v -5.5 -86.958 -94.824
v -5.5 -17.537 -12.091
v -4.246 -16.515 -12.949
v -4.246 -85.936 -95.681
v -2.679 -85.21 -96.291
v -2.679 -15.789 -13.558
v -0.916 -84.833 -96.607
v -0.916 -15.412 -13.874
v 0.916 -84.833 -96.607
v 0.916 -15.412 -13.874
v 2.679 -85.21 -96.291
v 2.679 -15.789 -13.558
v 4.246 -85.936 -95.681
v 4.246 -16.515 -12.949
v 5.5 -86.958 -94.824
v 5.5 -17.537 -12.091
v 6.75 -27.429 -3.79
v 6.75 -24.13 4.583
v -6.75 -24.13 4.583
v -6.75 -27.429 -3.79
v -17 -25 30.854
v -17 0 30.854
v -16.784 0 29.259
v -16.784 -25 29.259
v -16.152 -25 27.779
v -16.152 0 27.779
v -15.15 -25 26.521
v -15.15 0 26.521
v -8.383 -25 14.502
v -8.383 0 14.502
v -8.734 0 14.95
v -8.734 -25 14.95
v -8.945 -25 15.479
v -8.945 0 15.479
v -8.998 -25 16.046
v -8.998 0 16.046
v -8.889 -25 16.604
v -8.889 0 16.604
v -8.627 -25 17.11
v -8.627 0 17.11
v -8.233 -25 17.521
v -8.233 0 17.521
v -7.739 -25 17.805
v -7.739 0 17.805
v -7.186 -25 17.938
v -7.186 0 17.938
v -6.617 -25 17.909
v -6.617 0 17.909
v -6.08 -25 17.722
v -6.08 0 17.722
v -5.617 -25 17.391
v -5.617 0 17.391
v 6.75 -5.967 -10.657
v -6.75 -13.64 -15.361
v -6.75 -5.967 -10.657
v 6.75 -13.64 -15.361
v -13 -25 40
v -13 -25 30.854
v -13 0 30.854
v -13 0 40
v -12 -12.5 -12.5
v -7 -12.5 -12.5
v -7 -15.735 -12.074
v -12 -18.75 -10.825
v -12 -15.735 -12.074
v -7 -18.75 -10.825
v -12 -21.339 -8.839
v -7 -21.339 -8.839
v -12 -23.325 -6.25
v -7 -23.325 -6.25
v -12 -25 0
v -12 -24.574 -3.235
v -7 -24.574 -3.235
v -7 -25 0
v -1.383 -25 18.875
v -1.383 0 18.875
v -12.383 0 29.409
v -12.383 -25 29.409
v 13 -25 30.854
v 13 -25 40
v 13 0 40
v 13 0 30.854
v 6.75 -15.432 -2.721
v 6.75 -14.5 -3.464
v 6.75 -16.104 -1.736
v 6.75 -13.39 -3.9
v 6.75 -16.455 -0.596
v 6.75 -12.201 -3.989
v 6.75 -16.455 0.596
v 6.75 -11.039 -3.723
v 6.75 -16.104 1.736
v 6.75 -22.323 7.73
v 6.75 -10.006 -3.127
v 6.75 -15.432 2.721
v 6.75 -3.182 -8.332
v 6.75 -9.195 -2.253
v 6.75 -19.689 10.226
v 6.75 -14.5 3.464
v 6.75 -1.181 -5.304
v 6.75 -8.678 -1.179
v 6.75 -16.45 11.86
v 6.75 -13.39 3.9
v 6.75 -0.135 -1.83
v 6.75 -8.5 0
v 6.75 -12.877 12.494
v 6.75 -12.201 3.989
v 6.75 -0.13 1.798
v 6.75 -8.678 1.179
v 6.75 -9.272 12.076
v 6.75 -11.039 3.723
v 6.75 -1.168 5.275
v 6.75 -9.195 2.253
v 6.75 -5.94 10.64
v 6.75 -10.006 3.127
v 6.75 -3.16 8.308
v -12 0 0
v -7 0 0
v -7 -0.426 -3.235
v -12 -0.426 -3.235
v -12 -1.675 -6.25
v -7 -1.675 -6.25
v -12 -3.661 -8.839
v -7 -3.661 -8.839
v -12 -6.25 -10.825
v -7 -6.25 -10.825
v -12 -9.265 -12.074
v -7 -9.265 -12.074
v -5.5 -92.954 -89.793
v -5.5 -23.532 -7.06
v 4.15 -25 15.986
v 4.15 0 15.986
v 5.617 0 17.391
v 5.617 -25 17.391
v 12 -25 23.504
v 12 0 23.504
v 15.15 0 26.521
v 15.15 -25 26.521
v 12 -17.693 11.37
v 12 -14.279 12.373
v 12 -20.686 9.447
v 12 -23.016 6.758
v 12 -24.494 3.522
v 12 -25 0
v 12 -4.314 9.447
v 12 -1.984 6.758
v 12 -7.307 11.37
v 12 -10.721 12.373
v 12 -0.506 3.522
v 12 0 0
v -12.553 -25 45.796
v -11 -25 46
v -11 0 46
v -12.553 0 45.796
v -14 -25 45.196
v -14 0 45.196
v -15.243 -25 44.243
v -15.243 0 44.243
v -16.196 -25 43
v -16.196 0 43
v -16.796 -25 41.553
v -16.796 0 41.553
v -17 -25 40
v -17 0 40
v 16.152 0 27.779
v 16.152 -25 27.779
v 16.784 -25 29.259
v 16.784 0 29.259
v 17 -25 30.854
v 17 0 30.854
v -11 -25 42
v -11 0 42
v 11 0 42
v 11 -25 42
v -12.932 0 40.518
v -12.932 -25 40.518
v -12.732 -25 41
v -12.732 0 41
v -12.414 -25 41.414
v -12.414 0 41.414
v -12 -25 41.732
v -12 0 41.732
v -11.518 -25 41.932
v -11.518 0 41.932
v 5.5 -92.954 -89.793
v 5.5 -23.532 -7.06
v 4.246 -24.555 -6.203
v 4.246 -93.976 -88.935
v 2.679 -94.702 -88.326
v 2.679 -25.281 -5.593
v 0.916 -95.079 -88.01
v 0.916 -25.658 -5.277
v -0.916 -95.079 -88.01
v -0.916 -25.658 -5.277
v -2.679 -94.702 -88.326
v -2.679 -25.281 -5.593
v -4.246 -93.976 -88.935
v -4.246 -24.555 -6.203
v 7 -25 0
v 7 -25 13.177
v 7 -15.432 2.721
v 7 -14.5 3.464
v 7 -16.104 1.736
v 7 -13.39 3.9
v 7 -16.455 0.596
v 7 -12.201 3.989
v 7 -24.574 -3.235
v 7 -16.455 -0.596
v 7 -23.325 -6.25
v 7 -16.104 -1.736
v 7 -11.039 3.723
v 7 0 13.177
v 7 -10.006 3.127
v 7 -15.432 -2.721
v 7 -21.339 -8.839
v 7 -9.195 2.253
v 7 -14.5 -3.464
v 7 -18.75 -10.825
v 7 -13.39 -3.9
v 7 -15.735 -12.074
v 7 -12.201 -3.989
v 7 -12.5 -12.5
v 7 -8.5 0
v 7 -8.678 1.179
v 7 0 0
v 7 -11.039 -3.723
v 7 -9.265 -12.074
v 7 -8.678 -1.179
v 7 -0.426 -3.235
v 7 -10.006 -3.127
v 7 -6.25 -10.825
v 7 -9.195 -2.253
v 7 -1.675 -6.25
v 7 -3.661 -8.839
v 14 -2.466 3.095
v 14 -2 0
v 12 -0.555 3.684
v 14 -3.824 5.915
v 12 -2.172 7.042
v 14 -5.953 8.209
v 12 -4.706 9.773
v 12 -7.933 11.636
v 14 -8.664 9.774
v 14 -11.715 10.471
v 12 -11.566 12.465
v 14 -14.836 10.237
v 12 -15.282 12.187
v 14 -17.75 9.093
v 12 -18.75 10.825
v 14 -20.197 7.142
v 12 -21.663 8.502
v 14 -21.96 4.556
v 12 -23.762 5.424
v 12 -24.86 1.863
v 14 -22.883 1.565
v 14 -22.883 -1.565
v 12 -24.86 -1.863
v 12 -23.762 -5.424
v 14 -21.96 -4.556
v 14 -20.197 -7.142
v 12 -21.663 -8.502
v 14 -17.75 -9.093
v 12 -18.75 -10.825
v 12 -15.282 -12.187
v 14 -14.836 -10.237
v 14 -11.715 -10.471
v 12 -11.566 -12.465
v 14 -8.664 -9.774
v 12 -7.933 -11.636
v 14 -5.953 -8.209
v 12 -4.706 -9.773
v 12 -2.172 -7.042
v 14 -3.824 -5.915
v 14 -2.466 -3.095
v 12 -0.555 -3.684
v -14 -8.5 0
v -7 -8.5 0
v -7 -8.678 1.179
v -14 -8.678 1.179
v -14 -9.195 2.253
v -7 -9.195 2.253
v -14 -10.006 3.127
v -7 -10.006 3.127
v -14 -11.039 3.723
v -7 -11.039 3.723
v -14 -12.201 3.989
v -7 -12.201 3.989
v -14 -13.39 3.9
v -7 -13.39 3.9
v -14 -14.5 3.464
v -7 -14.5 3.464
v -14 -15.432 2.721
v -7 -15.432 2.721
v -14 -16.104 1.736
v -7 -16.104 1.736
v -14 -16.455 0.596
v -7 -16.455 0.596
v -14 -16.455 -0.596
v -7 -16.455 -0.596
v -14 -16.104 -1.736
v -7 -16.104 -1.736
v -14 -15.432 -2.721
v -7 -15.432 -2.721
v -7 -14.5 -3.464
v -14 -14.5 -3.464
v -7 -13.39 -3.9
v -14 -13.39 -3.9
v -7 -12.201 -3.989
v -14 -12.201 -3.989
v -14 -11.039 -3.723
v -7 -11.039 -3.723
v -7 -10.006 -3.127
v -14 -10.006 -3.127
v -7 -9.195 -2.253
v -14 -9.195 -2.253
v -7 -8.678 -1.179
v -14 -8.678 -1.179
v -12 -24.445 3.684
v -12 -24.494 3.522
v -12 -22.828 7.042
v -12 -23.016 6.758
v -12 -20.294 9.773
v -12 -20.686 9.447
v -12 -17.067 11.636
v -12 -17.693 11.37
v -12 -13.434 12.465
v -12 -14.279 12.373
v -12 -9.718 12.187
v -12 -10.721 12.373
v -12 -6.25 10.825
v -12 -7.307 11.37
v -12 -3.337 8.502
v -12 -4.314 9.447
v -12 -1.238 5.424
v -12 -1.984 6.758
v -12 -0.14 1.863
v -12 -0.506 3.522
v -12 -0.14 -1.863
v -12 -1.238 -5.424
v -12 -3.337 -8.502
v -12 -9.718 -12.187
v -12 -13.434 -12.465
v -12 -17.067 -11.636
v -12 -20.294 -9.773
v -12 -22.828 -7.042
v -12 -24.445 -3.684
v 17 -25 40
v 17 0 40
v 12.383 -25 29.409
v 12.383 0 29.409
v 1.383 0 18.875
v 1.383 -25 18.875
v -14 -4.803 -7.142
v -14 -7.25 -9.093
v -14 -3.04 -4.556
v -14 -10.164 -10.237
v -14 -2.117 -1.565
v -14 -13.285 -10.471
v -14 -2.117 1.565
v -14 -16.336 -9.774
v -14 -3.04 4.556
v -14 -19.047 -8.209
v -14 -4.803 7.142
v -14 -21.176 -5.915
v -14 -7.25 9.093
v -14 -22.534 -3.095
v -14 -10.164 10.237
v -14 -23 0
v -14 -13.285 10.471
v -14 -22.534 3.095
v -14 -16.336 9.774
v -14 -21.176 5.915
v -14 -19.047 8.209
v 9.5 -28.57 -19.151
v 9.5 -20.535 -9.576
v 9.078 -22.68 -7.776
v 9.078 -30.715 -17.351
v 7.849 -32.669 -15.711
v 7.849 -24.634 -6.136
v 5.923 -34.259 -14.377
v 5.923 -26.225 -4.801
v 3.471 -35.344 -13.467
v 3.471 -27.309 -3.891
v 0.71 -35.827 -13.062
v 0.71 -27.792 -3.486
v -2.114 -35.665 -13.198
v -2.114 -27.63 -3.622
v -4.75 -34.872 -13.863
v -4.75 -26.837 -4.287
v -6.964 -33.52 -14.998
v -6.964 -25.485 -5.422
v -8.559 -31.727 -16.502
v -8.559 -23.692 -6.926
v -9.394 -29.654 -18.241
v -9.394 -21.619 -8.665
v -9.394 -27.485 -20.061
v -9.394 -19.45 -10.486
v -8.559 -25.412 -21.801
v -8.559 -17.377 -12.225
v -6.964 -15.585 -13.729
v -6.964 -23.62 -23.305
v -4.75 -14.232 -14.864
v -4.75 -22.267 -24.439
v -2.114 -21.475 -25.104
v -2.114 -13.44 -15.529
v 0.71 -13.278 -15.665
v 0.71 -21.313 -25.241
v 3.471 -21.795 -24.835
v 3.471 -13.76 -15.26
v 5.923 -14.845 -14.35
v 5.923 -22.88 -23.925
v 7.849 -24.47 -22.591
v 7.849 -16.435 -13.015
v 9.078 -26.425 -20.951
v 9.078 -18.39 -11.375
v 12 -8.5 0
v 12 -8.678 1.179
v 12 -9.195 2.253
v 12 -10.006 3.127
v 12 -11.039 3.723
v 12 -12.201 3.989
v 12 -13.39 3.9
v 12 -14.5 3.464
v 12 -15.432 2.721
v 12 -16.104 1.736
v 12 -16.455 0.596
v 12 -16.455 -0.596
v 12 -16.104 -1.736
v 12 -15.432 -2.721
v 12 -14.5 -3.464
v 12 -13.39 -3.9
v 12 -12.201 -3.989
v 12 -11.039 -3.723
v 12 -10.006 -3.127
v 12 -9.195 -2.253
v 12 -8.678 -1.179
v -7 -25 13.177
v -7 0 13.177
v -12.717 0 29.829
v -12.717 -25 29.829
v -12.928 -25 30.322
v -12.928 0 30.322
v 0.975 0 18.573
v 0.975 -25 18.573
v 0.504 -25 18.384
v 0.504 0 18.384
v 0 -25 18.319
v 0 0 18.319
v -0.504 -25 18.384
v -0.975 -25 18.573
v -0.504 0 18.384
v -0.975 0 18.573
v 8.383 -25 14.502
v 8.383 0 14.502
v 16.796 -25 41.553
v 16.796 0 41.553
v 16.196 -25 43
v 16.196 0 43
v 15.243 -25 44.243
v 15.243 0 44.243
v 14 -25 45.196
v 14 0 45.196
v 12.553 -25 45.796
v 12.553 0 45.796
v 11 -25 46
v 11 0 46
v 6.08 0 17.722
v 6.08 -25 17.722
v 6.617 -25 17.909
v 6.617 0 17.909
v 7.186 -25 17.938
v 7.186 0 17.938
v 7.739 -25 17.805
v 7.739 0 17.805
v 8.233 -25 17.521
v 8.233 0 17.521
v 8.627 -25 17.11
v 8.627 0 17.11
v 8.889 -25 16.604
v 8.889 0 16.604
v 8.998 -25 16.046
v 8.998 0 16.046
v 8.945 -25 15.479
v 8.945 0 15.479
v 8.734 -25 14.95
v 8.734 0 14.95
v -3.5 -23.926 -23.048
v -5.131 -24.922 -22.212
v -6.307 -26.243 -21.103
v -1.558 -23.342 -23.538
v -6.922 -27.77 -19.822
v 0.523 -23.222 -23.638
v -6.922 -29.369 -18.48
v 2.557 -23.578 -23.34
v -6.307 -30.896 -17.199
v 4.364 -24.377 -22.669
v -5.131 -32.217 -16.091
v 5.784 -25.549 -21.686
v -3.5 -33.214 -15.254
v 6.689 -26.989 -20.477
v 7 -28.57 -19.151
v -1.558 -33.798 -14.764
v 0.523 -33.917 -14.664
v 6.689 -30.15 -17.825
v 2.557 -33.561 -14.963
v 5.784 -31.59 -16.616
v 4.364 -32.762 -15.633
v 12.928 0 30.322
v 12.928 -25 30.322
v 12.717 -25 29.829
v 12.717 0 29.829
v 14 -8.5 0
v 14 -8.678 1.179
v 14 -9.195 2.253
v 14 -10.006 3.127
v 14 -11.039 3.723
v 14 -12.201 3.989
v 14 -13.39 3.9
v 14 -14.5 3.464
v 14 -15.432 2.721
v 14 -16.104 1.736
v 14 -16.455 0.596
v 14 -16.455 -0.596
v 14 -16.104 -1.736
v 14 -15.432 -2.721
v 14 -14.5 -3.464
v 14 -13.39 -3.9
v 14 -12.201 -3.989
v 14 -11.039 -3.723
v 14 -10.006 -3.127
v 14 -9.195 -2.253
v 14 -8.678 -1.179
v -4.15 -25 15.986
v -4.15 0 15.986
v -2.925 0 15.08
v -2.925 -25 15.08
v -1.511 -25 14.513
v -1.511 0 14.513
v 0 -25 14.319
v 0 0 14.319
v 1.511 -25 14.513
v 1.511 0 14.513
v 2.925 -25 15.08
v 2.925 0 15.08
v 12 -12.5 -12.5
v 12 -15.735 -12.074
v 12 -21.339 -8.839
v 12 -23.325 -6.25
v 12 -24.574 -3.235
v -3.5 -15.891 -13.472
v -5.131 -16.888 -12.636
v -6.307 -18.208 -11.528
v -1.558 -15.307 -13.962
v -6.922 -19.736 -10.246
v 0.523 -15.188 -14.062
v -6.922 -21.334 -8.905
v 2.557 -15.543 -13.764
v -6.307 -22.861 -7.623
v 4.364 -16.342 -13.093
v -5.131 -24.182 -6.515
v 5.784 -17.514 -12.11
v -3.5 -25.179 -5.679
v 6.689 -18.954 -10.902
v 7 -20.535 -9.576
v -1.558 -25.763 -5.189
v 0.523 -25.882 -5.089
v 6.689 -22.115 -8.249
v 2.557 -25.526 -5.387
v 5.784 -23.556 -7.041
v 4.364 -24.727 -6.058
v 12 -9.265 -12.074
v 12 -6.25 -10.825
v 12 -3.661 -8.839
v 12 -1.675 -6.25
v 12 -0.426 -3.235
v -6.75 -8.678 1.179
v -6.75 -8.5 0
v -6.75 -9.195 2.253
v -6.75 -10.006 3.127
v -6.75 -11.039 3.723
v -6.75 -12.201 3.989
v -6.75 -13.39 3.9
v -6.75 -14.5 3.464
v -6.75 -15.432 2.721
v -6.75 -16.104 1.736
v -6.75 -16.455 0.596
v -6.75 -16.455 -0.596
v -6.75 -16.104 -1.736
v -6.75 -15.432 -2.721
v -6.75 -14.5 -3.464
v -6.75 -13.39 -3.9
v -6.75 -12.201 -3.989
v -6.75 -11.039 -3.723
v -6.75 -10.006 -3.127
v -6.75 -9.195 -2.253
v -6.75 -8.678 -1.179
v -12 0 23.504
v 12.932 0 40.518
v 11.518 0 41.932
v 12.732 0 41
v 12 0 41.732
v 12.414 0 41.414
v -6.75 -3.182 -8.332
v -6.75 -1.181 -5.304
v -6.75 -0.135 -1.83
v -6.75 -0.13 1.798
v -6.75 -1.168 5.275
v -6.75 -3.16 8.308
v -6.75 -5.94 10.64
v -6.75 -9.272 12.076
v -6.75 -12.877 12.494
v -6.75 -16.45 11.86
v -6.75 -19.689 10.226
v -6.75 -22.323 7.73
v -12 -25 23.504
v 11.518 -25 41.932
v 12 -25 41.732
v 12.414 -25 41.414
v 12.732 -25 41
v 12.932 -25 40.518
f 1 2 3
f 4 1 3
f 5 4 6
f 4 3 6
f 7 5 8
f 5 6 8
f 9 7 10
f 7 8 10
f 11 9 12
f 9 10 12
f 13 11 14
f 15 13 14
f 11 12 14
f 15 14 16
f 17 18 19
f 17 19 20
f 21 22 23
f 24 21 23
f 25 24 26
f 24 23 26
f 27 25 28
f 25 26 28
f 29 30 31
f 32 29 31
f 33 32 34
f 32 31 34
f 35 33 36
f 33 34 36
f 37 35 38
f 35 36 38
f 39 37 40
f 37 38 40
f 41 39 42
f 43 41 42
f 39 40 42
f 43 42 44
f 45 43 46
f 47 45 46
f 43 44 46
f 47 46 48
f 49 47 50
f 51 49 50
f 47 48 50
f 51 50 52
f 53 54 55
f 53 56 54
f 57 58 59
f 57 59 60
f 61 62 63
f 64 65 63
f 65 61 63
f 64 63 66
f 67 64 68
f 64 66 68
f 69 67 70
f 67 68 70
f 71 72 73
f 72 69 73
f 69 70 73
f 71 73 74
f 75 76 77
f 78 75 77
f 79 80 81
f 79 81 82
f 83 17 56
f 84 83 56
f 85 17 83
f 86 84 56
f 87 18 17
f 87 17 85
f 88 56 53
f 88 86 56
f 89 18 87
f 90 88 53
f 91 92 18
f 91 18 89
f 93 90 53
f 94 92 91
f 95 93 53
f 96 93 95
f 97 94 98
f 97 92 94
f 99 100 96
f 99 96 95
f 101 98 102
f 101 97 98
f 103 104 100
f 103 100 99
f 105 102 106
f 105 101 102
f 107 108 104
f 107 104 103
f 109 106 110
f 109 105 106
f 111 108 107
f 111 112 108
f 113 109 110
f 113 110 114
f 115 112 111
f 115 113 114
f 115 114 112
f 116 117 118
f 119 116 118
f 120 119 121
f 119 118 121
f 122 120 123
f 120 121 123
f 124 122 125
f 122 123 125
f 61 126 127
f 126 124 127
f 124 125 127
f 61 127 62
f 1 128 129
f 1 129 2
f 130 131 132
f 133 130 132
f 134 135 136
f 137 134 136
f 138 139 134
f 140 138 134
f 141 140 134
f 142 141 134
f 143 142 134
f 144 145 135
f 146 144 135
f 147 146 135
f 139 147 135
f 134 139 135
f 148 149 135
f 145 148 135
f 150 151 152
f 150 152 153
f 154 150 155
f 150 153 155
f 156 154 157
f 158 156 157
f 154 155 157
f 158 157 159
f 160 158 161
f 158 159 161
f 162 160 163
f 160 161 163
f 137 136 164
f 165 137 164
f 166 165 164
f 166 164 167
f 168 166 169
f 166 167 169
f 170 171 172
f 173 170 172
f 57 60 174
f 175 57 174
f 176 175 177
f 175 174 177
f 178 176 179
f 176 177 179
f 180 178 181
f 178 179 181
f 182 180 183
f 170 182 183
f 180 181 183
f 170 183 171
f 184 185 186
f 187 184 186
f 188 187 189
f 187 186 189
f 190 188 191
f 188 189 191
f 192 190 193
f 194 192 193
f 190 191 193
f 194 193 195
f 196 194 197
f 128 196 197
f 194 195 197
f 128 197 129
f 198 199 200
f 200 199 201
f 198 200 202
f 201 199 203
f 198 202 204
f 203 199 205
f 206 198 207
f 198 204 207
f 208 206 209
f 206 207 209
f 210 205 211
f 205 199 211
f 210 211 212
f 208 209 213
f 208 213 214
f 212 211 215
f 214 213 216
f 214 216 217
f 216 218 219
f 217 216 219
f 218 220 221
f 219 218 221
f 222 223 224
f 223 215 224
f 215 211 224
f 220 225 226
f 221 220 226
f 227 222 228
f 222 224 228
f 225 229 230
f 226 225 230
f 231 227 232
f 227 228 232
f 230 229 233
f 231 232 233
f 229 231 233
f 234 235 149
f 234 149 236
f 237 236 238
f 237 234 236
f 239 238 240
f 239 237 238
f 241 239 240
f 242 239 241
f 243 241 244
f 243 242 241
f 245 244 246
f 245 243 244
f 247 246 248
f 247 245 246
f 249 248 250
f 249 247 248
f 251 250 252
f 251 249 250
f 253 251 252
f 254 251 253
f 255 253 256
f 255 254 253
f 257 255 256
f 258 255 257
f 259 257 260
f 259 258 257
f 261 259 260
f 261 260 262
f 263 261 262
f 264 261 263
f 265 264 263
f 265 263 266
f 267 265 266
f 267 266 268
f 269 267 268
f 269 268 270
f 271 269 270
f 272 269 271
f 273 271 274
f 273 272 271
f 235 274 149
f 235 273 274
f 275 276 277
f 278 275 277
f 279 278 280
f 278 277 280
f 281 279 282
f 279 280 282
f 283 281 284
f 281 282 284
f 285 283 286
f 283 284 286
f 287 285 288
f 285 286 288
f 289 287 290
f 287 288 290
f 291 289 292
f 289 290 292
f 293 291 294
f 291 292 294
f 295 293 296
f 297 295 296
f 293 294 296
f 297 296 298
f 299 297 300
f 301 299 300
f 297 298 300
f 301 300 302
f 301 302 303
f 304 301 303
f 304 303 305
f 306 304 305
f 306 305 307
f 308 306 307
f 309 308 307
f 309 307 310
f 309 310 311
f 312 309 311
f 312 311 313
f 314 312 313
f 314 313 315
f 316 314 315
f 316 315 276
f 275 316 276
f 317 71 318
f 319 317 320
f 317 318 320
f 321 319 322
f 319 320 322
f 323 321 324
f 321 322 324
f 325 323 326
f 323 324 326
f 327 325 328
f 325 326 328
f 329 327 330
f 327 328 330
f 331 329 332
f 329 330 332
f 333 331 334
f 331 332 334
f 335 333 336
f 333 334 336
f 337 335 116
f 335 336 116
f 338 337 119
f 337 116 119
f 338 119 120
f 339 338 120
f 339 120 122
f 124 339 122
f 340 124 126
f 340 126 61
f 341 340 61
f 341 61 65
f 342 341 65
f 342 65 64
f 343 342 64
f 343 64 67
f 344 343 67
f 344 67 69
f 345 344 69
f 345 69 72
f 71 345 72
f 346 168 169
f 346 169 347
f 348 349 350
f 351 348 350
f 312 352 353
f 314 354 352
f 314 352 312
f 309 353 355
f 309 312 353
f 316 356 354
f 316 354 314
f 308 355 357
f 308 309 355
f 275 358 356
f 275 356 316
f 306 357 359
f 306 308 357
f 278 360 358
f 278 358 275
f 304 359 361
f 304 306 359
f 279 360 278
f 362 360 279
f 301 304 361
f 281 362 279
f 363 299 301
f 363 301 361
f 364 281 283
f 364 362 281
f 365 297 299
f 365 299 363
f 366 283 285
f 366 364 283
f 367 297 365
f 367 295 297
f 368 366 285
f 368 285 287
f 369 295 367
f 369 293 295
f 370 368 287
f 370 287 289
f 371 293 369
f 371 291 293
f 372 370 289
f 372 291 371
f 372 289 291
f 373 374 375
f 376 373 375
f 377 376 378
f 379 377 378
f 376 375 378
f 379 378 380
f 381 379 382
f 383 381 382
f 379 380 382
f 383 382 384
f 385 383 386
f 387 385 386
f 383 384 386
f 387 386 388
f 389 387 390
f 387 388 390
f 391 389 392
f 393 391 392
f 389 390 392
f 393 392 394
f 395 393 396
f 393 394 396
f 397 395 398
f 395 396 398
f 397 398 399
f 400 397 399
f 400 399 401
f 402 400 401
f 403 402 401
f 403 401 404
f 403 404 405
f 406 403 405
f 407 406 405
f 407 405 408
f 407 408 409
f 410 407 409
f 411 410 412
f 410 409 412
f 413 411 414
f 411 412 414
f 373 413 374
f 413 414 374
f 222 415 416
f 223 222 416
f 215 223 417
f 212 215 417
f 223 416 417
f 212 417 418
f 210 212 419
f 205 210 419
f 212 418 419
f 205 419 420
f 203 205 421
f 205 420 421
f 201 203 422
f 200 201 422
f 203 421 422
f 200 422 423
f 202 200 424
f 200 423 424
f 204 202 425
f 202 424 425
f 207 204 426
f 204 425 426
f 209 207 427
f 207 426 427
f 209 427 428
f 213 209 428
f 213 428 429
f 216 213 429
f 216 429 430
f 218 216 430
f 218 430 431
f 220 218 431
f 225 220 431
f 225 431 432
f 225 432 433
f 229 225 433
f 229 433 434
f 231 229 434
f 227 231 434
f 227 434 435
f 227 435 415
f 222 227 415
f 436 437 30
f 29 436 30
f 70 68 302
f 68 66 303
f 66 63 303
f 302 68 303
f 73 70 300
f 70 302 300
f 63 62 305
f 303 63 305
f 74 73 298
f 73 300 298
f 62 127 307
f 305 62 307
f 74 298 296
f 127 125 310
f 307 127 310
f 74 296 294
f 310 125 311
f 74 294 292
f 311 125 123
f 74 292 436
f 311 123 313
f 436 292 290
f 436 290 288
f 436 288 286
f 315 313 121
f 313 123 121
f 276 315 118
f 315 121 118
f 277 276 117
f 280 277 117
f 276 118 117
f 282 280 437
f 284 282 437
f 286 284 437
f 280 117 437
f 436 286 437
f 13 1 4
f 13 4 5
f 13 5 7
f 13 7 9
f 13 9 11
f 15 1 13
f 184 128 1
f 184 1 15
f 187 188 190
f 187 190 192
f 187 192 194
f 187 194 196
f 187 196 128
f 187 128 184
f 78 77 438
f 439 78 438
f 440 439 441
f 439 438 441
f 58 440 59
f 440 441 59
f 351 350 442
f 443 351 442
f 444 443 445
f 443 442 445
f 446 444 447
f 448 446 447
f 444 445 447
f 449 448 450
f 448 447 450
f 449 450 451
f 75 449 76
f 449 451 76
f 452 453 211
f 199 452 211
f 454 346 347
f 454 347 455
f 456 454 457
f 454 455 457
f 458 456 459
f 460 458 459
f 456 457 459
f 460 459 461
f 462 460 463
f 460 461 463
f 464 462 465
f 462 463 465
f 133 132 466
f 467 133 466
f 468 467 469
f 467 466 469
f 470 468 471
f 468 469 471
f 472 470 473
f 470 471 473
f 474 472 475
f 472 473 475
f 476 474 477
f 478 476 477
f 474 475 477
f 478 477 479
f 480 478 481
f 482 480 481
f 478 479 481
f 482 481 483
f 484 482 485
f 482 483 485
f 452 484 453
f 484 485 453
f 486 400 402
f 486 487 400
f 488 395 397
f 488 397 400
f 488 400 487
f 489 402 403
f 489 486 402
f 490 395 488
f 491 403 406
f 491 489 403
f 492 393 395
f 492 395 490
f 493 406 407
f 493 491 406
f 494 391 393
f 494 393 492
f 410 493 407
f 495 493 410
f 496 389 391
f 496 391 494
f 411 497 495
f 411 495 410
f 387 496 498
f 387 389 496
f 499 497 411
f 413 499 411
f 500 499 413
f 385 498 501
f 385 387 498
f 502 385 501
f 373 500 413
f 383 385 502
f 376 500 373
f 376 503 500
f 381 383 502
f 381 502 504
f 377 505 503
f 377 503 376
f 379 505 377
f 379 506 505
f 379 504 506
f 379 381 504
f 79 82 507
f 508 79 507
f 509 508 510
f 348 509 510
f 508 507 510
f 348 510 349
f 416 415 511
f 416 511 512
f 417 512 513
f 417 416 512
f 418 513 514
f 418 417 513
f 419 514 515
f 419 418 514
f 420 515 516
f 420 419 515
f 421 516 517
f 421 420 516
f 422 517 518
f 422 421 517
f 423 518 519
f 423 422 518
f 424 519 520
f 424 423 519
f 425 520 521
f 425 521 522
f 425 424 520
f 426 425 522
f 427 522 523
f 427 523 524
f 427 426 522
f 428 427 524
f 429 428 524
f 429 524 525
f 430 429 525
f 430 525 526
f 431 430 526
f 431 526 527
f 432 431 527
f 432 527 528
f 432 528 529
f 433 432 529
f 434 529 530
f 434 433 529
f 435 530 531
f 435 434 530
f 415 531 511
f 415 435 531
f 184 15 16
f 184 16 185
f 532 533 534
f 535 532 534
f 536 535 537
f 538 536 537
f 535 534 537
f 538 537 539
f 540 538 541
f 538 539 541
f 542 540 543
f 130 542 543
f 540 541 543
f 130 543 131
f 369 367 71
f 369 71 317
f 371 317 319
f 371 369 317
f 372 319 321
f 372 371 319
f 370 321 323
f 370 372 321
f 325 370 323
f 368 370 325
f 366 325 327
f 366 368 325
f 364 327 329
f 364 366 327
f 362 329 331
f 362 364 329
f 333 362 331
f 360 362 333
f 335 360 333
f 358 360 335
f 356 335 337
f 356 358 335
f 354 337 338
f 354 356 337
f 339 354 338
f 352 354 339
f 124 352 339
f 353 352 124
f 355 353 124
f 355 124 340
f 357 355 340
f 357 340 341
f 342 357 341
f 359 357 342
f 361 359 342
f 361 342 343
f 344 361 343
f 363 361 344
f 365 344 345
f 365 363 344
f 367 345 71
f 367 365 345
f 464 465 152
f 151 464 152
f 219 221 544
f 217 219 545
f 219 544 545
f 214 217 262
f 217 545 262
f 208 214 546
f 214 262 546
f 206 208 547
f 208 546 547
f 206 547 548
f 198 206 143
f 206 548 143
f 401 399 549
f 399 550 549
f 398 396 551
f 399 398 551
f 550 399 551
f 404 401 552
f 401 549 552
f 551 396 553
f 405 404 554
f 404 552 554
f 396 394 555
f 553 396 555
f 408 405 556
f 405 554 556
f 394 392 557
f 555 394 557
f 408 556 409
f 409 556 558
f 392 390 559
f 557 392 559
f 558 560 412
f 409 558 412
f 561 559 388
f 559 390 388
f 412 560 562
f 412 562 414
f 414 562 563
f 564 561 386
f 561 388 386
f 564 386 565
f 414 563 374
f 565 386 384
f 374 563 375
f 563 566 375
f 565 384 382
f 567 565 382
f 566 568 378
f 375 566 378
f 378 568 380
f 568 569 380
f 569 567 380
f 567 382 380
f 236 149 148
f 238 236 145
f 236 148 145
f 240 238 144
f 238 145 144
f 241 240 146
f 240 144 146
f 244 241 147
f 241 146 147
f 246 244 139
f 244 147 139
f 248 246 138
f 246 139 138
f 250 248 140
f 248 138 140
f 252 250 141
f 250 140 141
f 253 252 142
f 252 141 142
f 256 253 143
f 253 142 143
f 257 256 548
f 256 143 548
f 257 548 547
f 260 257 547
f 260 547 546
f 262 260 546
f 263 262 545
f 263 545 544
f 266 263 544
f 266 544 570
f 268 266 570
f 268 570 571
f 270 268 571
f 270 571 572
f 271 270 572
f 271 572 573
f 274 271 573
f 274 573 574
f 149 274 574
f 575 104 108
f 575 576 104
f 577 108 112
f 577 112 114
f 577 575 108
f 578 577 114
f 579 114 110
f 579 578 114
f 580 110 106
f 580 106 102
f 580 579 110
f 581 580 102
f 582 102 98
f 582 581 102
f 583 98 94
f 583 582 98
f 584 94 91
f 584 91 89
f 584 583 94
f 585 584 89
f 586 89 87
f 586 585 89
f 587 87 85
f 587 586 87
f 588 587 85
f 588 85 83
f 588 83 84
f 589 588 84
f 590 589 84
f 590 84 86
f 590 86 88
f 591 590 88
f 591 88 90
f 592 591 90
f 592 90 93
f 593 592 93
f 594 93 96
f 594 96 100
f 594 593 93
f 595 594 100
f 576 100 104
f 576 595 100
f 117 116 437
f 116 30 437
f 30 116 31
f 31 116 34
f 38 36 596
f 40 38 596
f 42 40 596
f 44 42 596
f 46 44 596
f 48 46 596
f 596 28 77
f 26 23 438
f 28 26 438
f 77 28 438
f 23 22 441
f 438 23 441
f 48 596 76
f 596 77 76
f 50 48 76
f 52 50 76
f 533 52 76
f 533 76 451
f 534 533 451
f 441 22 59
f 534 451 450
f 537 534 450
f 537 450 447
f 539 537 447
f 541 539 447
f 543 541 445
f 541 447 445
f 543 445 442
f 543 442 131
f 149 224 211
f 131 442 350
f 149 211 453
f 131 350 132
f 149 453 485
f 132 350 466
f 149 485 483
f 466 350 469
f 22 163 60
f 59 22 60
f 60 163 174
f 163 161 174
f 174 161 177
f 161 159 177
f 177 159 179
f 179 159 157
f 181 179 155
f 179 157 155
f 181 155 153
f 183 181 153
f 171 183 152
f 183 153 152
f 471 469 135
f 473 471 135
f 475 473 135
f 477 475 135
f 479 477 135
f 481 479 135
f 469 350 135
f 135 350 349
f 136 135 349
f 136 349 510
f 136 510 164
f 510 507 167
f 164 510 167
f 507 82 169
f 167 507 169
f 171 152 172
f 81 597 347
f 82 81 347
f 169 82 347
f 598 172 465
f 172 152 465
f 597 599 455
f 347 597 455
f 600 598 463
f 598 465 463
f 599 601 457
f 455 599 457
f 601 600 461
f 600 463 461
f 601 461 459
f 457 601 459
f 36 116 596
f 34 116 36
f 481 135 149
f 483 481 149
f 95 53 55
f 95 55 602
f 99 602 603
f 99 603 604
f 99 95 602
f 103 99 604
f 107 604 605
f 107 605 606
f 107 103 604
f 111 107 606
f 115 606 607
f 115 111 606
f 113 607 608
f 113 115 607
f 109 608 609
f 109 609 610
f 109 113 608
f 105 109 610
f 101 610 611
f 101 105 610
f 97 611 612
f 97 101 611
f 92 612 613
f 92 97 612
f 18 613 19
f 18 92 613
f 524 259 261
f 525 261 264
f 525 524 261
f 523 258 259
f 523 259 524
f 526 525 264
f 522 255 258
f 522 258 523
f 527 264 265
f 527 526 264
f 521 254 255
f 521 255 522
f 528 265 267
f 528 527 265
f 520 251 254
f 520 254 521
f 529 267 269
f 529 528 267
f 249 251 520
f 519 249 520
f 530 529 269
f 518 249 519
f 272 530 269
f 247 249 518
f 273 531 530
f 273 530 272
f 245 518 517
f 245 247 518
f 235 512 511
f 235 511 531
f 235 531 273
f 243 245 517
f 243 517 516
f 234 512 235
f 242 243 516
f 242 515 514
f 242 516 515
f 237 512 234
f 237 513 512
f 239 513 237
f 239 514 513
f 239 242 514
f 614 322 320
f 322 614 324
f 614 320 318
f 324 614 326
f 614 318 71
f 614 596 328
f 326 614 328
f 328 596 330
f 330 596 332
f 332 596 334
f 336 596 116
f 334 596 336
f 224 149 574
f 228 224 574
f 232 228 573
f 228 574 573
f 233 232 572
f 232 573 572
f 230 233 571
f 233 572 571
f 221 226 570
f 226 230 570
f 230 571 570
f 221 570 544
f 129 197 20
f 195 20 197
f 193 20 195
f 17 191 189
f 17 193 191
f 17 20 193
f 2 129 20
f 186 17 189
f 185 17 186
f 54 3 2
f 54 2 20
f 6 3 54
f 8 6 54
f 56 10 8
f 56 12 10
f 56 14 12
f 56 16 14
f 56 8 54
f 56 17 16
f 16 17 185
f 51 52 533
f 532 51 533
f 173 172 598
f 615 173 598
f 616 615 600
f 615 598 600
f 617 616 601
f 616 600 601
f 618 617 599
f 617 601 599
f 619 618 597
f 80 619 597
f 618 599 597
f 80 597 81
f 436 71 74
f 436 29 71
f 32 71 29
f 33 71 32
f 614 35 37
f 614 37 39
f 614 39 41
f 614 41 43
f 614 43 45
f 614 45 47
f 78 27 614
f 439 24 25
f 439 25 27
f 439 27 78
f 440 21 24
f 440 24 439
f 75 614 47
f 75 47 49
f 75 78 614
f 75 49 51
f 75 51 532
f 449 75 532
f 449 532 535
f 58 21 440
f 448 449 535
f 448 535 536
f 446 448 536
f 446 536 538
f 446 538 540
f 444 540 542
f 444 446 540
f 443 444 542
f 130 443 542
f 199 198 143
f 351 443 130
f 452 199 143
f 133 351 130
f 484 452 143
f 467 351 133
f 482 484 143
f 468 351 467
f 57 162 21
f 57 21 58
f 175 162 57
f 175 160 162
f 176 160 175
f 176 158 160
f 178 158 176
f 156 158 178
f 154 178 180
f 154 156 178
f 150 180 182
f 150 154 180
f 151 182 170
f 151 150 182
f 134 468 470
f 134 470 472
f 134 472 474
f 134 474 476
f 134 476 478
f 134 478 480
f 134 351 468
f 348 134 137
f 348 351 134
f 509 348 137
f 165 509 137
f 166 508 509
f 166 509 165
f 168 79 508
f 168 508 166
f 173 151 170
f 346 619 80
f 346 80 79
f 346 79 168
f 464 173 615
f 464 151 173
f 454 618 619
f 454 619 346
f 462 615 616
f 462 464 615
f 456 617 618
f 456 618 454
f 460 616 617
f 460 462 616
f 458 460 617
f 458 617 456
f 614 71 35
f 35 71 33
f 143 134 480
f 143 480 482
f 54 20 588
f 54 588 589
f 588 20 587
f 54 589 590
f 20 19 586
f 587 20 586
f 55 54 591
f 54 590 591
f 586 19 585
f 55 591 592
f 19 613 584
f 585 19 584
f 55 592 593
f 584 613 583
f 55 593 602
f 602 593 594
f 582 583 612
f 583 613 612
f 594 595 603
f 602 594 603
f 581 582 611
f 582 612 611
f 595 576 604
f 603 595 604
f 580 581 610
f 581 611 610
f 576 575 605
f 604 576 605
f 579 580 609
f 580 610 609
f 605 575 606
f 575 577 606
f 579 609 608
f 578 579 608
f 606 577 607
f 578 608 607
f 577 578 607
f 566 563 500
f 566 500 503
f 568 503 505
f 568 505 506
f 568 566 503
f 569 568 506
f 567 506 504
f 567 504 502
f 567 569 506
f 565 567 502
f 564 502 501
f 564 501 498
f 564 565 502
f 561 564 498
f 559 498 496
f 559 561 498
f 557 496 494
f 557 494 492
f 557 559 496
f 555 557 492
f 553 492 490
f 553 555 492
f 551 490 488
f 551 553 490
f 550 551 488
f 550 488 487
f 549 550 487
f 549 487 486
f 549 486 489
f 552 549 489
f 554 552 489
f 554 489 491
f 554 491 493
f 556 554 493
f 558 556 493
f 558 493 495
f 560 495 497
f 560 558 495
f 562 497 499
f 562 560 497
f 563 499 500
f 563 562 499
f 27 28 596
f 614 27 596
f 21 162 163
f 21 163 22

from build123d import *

# Parameters (mm, degrees)
F1_DEPTH  = 25
F3_DEPTH  = 25
F2_R      = 12.5
F2_R_2    = 4
F4_DEPTH  = 2
F5_SIZE   = 1.99999
F6_R      = 12.5
F7_DEPTH  = 2
F8_SIZE   = 1.99999
F9_DEPTH  = 30
F10_R     = 4
F11_DEPTH = 6.75
F13_DEPTH = 108
F12_R     = 9.5
F12_R_2   = 7
F14_DEPTH = 12.5


# Not quite as in the source:
# - a fillet or chamfer is up to 0.001 mm smaller than in the source, because OpenCascade refuses the exact size


with BuildPart() as f1:
    # F0 (on Front) → F1 (new body)
    with BuildSketch(Plane.XZ):
        with BuildLine():
            ThreePointArc((-17, 30.8538616003), (-16.5181427671, 28.4979964934), (-15.1499665327, 26.520528267))
            Line((-15.1499665327, 26.520528267), (-12, 23.5038538771))
            Line((-12, 23.5038538771), (-12, -12.5))
            Line((-12, -12.5), (-7, -12.5))
            Line((-7, -12.5), (-7, 13.1769694163))
            Line((-7, 13.1769694163), (-8.3833221776, 14.5017557411))
            ThreePointArc((-8.3833221776, 14.5017557411), (-8.4444444444, 17.3295223631), (-5.6166778224, 17.39064463))
            Line((-5.6166778224, 17.39064463), (-4.1499665327, 15.9859978379))
            ThreePointArc((-4.1499665327, 15.9859978379), (0, 14.3193311712), (4.1499665327, 15.9859978379))
            Line((4.1499665327, 15.9859978379), (5.6166778224, 17.39064463))
            ThreePointArc((5.6166778224, 17.39064463), (8.4444444444, 17.3295223631), (8.3833221776, 14.5017557411))
            Line((8.3833221776, 14.5017557411), (7, 13.1769694163))
            Line((7, 13.1769694163), (7, -12.5))
            Line((7, -12.5), (12, -12.5))
            Line((12, -12.5), (12, 23.5038538771))
            Line((12, 23.5038538771), (15.1499665327, 26.520528267))
            ThreePointArc((15.1499665327, 26.520528267), (16.5181427671, 28.4979964934), (17, 30.8538616003))
            Line((17, 30.8538616003), (17, 40))
            ThreePointArc((17, 40), (15.2426406871, 44.2426406871), (11, 46))
            Line((11, 46), (0, 46))
            Line((0, 46), (-11, 46))
            ThreePointArc((-11, 46), (-15.2426406871, 44.2426406871), (-17, 40))
            Line((-17, 40), (-17, 30.8538616003))
        make_face()
        with BuildLine():
            Line((-11, 42), (0, 42))
            Line((0, 42), (11, 42))
            ThreePointArc((11, 42), (12.4142135624, 41.4142135624), (13, 40))
            Line((13, 40), (13, 30.8538616003))
            ThreePointArc((13, 30.8538616003), (12.8393809224, 30.0685732313), (12.3833221776, 29.4094171559))
            Line((12.3833221776, 29.4094171559), (1.3833221776, 18.8748867268))
            ThreePointArc((1.3833221776, 18.8748867268), (0, 18.3193311712), (-1.3833221776, 18.8748867268))
            Line((-1.3833221776, 18.8748867268), (-12.3833221776, 29.4094171559))
            ThreePointArc((-12.3833221776, 29.4094171559), (-12.8393809224, 30.0685732313), (-13, 30.8538616003))
            Line((-13, 30.8538616003), (-13, 40))
            ThreePointArc((-13, 40), (-12.4142135624, 41.4142135624), (-11, 42))
        make_face(mode=Mode.SUBTRACT)
    extrude(amount=F1_DEPTH)

    # F2 (on face) → F3 (cut)
    with BuildSketch(Plane.YZ.offset(12)):
        with BuildLine():
            ThreePointArc((-12.5, -12.5), (-21.3388347734, -8.8388347563), (-25, 2.41e-08))
            Line((-25, 2.41e-08), (-25, -12.5))
            Line((-25, -12.5), (-12.5, -12.5))
        make_face()
        with BuildLine():
            Line((0, -12.5), (0, 0))
            ThreePointArc((0, 0), (-3.6611652352, -8.8388347648), (-12.5, -12.5))
            Line((-12.5, -12.5), (0, -12.5))
        make_face()
    extrude(amount=-F3_DEPTH, mode=Mode.SUBTRACT)

    # F2 (on face) → F4 (join)
    with BuildSketch(Plane.YZ.offset(12)):
        with Locations((-12.5, 0)):
            Circle(F2_R)
        with Locations((-12.5, 0)):
            Circle(F2_R_2, mode=Mode.SUBTRACT)
    extrude(amount=F4_DEPTH)

    # F5 (size 2 in the source; OpenCascade refuses exactly that, so slightly less here)
    f5_edges = [f1.edges().sort_by_distance(p)[0] for p in [
        (14, -25, 0),
    ]]
    chamfer(f5_edges, length=F5_SIZE)

    # F6 (on face) → F7 (join)
    with BuildSketch(Plane(origin=(-12, 0, 0), x_dir=(0, -1, 0), z_dir=(-1, 0, 0))):
        with Locations((12.5, 0)):
            Circle(F6_R)
    extrude(amount=F7_DEPTH)

    # F8 (size 2 in the source; OpenCascade refuses exactly that, so slightly less here)
    f8_edges = [f1.edges().sort_by_distance(p)[0] for p in [
        (-14, 0, 0),
    ]]
    chamfer(f8_edges, length=F8_SIZE)

    # F2 (on face) → F9 (cut)
    with BuildSketch(Plane.YZ.offset(12)):
        with Locations((-12.5, 0)):
            Circle(F2_R_2)
    extrude(amount=-F9_DEPTH, mode=Mode.SUBTRACT)


with BuildPart() as f11:
    # F10 (on Right) → F11 (new body, symmetric)
    with BuildSketch(Plane.YZ):
        with BuildLine():
            Line((-13.640445133, -15.3606440262), (-5.9673218086, -10.6571157284))
            ThreePointArc((-5.9673218086, -10.6571157284), (-4.4651548789, 9.575555539), (-24.1295978573, 4.5828434054))
            Line((-24.1295978573, 4.5828434054), (-27.4292451092, -3.7904670518))
            Line((-27.4292451092, -3.7904670518), (-20.5348451211, -9.575555539))
            Line((-20.5348451211, -9.575555539), (-13.640445133, -15.3606440262))
        make_face()
        with Locations((-12.5, 0)):
            Circle(F10_R, mode=Mode.SUBTRACT)
    extrude(amount=F11_DEPTH, both=True)

    # F12 (on face) → F13 (join)
    with BuildSketch(Plane(origin=(0, -13.1995440107, -15.7306039953), x_dir=(1, 0, 0), z_dir=(0, -0.6427876097, -0.7660444431))):
        with BuildLine():
            Line((5.5, 5.6624365784), (5.5, 13.4886744996))
            ThreePointArc((5.5, 13.4886744996), (0, 16.325555539), (-5.5, 13.4886744996))
            Line((-5.5, 13.4886744996), (-5.5, 5.6624365784))
            ThreePointArc((-5.5, 5.6624365784), (0, 2.825555539), (5.5, 5.6624365784))
        make_face()
    extrude(amount=F13_DEPTH)


with BuildPart() as f14:
    # F12 (on face) → F14 (new body)
    with BuildSketch(Plane(origin=(0, -13.1995440107, -15.7306039953), x_dir=(1, 0, 0), z_dir=(0, -0.6427876097, -0.7660444431))):
        with Locations((0, 9.575555539)):
            Circle(F12_R)
        with Locations((0, 9.575555539)):
            Circle(F12_R_2, mode=Mode.SUBTRACT)
    extrude(amount=F14_DEPTH)


solid = Compound([f1.part, f11.part, f14.part])
